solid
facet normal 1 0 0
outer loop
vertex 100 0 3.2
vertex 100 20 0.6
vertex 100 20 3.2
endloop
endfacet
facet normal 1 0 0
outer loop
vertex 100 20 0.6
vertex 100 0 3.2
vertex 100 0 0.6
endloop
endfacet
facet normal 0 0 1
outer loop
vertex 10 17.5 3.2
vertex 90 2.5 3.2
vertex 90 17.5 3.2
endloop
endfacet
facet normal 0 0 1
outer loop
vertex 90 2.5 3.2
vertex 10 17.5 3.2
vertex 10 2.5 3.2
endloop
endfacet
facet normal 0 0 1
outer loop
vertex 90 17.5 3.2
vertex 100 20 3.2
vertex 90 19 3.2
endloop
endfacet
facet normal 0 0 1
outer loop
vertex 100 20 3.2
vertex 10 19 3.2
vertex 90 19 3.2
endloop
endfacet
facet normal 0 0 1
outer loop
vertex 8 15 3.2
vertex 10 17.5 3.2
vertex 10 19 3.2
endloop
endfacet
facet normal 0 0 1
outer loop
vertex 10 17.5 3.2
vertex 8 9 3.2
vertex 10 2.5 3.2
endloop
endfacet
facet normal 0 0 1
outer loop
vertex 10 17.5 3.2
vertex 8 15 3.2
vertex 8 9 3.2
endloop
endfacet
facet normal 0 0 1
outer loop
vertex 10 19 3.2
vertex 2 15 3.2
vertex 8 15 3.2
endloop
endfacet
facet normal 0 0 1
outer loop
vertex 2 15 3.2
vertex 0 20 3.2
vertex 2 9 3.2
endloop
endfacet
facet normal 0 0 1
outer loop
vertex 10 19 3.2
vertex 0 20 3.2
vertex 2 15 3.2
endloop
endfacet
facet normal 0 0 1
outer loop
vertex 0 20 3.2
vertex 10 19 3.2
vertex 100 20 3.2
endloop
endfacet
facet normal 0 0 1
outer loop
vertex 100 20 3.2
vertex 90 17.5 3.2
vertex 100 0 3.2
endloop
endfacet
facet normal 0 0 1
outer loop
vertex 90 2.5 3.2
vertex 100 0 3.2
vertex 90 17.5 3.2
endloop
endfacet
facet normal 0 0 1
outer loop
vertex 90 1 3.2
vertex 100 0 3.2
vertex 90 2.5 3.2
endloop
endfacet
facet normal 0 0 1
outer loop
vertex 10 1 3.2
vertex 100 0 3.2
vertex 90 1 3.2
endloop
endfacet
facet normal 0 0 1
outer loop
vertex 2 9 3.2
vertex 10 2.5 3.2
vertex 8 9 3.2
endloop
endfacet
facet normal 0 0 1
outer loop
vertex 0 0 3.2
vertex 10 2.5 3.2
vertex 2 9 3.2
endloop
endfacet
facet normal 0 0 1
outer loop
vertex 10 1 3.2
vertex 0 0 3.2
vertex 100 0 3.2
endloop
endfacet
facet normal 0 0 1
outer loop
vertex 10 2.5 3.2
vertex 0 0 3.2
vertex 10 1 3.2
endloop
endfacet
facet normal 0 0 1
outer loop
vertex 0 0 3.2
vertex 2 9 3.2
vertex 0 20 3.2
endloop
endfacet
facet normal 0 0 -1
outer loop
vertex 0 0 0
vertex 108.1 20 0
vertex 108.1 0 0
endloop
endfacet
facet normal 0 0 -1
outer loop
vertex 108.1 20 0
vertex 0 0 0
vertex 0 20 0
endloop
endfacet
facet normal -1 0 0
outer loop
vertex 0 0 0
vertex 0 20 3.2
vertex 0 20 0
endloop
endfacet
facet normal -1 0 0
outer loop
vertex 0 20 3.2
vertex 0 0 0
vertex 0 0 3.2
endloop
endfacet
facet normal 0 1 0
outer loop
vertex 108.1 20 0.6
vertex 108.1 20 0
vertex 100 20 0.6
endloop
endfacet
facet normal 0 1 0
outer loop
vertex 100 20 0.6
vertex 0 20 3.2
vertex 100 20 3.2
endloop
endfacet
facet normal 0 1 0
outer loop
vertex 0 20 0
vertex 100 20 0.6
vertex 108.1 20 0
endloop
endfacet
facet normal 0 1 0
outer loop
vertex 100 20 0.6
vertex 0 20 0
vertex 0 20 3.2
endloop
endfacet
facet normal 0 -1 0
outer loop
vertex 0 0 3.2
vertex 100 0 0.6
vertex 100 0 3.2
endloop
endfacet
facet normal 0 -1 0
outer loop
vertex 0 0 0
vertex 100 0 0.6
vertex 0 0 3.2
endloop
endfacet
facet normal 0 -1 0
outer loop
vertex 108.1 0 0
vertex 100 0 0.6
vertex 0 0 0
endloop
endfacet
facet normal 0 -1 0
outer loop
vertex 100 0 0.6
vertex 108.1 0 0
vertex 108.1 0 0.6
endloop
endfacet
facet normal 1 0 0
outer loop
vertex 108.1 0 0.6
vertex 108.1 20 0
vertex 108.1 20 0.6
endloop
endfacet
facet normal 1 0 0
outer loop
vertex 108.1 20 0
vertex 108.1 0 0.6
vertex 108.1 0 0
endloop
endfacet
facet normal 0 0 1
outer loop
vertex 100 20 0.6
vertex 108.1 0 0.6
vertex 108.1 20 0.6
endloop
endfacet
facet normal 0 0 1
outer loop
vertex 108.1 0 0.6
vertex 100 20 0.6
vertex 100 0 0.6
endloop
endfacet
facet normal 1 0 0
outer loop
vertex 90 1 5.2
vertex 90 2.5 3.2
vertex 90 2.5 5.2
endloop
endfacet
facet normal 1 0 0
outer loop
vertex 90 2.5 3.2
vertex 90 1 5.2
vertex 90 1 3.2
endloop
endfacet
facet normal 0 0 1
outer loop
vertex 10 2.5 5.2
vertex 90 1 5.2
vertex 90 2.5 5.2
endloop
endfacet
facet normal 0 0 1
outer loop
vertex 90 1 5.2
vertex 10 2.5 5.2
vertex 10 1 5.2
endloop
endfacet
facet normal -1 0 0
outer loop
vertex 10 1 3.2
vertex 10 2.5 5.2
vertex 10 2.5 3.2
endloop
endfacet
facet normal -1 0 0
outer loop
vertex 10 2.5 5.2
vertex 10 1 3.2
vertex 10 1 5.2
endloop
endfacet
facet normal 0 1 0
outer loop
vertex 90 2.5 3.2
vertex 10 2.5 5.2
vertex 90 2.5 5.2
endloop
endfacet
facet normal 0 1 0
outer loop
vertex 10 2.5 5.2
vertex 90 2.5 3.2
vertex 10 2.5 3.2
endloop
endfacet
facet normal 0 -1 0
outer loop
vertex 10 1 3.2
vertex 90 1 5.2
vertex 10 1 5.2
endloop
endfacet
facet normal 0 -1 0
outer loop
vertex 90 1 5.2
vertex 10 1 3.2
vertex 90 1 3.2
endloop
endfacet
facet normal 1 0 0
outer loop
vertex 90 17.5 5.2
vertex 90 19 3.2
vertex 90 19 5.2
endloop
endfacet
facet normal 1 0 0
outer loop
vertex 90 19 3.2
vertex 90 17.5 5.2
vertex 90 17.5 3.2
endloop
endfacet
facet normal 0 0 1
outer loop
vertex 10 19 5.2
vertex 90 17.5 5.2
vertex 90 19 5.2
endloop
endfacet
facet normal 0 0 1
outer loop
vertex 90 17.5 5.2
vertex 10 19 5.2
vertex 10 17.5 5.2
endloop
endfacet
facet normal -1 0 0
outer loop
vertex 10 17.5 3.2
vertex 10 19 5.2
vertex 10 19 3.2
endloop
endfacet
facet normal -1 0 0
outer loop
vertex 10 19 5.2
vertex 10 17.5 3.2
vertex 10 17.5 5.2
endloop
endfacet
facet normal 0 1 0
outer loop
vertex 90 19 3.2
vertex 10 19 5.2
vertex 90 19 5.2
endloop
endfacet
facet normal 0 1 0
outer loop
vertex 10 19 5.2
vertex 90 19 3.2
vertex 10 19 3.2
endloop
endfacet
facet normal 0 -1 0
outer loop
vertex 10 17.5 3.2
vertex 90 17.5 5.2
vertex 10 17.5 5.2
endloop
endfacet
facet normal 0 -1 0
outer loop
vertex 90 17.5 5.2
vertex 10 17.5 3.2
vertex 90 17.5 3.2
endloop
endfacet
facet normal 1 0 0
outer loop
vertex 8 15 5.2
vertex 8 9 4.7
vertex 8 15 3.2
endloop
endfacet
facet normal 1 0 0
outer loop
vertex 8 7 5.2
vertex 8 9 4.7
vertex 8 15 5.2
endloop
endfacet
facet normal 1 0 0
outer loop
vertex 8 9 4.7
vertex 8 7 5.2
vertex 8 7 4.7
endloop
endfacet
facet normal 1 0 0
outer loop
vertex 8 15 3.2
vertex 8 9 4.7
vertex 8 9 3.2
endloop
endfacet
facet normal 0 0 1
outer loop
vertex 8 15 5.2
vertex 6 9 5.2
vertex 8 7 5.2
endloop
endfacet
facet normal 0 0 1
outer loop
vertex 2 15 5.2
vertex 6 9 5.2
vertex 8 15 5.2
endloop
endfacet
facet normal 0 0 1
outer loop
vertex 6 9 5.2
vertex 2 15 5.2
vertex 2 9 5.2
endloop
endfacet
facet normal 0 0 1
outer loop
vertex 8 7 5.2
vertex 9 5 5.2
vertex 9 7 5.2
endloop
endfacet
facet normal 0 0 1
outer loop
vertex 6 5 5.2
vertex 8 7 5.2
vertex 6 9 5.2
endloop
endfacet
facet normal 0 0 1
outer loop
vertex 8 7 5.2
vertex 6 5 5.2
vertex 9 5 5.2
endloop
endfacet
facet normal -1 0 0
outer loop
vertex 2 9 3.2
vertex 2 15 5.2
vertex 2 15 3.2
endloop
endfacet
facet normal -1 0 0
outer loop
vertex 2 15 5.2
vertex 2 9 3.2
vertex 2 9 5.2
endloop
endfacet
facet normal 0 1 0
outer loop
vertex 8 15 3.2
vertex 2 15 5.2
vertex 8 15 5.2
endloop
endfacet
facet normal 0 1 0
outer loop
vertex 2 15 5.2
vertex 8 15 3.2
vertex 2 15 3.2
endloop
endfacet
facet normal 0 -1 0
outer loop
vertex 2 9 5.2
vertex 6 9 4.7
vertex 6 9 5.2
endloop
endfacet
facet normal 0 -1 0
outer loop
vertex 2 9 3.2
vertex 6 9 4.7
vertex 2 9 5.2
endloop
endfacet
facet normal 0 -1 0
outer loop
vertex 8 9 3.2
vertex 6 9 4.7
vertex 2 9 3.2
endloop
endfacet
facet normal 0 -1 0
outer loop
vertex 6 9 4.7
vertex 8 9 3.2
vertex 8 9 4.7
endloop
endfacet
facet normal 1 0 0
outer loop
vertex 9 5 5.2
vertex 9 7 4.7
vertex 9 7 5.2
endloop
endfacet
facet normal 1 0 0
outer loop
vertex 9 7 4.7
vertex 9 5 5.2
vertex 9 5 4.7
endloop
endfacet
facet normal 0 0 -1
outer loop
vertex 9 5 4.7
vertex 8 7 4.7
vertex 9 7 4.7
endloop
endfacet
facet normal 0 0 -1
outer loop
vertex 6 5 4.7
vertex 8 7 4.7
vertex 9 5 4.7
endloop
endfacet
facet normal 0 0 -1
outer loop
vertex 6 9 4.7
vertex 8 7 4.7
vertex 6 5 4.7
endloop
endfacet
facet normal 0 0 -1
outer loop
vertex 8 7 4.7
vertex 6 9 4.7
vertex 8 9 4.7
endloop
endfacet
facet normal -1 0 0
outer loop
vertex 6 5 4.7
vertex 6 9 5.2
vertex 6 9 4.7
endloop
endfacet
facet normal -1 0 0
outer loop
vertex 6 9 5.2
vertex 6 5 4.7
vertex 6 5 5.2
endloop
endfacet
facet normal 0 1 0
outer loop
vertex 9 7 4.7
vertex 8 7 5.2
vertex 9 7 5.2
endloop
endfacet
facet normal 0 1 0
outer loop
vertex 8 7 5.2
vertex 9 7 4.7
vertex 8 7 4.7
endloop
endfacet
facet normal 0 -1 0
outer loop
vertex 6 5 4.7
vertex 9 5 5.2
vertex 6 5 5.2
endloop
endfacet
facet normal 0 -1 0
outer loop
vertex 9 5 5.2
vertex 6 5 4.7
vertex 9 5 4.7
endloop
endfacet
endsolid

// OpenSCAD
// Bag clip living hinge, PETG, 0.4 nozzle, no supports.
// Two halves contacting at hinge, open flat print pose.
// Fold: rotate upper 180 about [108,10,5.2] -Y. F(x)=216-x, F(z)=10.4-z.

part = "arm_lower"; // [arm_lower, arm_upper, assembly]
cadverify_only = "";

module instance(name, part, unit = 1) {
    echo(cadverify_instance = [name, part, unit]);
    if (cadverify_only == "" || cadverify_only == name) children();
}

module arm_lower() {
    cube([100, 20, 3.2], false);
    translate([99.9, 0, 0]) cube([8.2, 20, 0.6], false);
    translate([10, 1, 3.1]) cube([80, 1.5, 2.1], false);
    translate([10, 17.5, 3.1]) cube([80, 1.5, 2.1], false);
    // stop tower (central)
    translate([2, 9, 3.1]) cube([6, 6, 2.1], false);
    // lower hook base region uses body; hook lip + bridge
    translate([6, 5, 4.7]) cube([3, 2, 0.5], false);
    translate([6, 6.9, 4.7]) cube([2, 2.2, 0.5], false);
}

module arm_upper() {
    cube([8.2, 20, 0.6], false);
    translate([7.9, 0, 0]) cube([100.1, 20, 3.2], false);
    // stop tower (central) local x 102-106 -> folded 2-6
    translate([102, 9, 3.1]) cube([4, 6, 2.1], false);
    // upper hook post (Y 13-15) tall
    translate([102, 13, 3.1]) cube([4, 2, 3.3], false);
    // Y bridge 7-13
    translate([99, 6.9, 5.8]) cube([3.1, 6.2, 0.6], false);
    // upper hook lip (Y 5-7)
    translate([99, 5, 5.8]) cube([3.1, 2, 0.6], false);
    // thumb tab
    translate([107.9, 6, 0]) cube([8.1, 8, 3.2], false);
}

if (part == "arm_lower") {
    echo(cadverify_spec = [
        ["bounds", [[0, 0, 0], [108.1, 20, 5.2]]],
        ["bodies", 1],
        ["through_holes", 0],
        ["support_faces", [["bed", "-z", 1500]]],
        ["overhangs_allowed", [["latch lip", [[5.5, 4.5, 4.5], [9.5, 9.5, 5.5]]]]],
        ["copies", 1],
        ["details", [
            ["arm", "material", [[30, 10, 1.2], [70, 12, 2.0]], 1],
            ["arm_wall", "thickness", [50, 10, 10], [0, 0, -1], 3.2],
            ["hinge", "thickness", [104, 10, 5], [0, 0, -1], 0.6],
            ["rib", "material", [[30, 1.3, 3.8], [70, 2.2, 4.8]], 1],
            ["rib2", "material", [[30, 17.8, 3.8], [70, 18.7, 4.8]], 1],
            ["latch_tower", "material", [[3, 10, 3.8], [7, 14, 5.0]], 1],
            ["latch_lip", "material", [[6.5, 5.5, 4.8], [8.5, 6.5, 5.1]], 1],
            ["bag_slot", "void", [[30, 4, 3.8], [70, 16, 5.0]], 1]
        ]]
    ]);
    arm_lower();
} else if (part == "arm_upper") {
    echo(cadverify_spec = [
        ["bounds", [[0, 0, 0], [116, 20, 6.4]]],
        ["bodies", 1],
        ["through_holes", 0],
        ["support_faces", [["bed", "-z", 1500]]],
        ["overhangs_allowed", [["latch lip", [[98.5, 4.5, 5.6], [102.5, 13.5, 6.6]]]]],
        ["copies", 1],
        ["details", [
            ["arm", "material", [[30, 10, 1.2], [70, 12, 2.0]], 1],
            ["arm_wall", "thickness", [50, 10, 10], [0, 0, -1], 3.2],
            ["hinge", "thickness", [4, 10, 5], [0, 0, -1], 0.6],
            ["latch_tower", "material", [[102.5, 10, 3.8], [105.5, 14, 5.0]], 1],
            ["latch_lip", "material", [[99.5, 5.5, 5.9], [101.5, 6.5, 6.3]], 0.99],
            ["thumb_tab", "material", [[109, 7, 1.2], [114, 13, 2.0]], 0.99],
            ["field", "void", [[30, 4, 3.8], [70, 16, 5.0]], 1]
        ]]
    ]);
    arm_upper();
} else if (part == "assembly") {
    echo(cadverify_spec = [
        ["bounds", [[0, 0, 0], [224.1, 20, 6.4]]],
        ["support_faces", [["bed", "-z", 3000]]],
        ["allowed_interferences", [["lower", "upper", "hinge fused"]]],
        ["motions", [
            ["close", ["upper"], "rotate", [108, 10, 5.2], [0, -1, 0], [0, 180],
                ["flex", [["upper", "lower", 1.0, "latch snap"]]],
                ["stops", [180]],
                ["rests", [0, 180]]
            ]
        ]],
        ["assembly_order", [
            [["lower"], [0, 0, 0]],
            [["upper"], [0, 0, -1]]
        ]],
        ["print_in_place", 0.3]
    ]);
    instance("lower", "arm_lower") arm_lower();
    instance("upper", "arm_upper") translate([108, 0, 0]) arm_upper();
}
